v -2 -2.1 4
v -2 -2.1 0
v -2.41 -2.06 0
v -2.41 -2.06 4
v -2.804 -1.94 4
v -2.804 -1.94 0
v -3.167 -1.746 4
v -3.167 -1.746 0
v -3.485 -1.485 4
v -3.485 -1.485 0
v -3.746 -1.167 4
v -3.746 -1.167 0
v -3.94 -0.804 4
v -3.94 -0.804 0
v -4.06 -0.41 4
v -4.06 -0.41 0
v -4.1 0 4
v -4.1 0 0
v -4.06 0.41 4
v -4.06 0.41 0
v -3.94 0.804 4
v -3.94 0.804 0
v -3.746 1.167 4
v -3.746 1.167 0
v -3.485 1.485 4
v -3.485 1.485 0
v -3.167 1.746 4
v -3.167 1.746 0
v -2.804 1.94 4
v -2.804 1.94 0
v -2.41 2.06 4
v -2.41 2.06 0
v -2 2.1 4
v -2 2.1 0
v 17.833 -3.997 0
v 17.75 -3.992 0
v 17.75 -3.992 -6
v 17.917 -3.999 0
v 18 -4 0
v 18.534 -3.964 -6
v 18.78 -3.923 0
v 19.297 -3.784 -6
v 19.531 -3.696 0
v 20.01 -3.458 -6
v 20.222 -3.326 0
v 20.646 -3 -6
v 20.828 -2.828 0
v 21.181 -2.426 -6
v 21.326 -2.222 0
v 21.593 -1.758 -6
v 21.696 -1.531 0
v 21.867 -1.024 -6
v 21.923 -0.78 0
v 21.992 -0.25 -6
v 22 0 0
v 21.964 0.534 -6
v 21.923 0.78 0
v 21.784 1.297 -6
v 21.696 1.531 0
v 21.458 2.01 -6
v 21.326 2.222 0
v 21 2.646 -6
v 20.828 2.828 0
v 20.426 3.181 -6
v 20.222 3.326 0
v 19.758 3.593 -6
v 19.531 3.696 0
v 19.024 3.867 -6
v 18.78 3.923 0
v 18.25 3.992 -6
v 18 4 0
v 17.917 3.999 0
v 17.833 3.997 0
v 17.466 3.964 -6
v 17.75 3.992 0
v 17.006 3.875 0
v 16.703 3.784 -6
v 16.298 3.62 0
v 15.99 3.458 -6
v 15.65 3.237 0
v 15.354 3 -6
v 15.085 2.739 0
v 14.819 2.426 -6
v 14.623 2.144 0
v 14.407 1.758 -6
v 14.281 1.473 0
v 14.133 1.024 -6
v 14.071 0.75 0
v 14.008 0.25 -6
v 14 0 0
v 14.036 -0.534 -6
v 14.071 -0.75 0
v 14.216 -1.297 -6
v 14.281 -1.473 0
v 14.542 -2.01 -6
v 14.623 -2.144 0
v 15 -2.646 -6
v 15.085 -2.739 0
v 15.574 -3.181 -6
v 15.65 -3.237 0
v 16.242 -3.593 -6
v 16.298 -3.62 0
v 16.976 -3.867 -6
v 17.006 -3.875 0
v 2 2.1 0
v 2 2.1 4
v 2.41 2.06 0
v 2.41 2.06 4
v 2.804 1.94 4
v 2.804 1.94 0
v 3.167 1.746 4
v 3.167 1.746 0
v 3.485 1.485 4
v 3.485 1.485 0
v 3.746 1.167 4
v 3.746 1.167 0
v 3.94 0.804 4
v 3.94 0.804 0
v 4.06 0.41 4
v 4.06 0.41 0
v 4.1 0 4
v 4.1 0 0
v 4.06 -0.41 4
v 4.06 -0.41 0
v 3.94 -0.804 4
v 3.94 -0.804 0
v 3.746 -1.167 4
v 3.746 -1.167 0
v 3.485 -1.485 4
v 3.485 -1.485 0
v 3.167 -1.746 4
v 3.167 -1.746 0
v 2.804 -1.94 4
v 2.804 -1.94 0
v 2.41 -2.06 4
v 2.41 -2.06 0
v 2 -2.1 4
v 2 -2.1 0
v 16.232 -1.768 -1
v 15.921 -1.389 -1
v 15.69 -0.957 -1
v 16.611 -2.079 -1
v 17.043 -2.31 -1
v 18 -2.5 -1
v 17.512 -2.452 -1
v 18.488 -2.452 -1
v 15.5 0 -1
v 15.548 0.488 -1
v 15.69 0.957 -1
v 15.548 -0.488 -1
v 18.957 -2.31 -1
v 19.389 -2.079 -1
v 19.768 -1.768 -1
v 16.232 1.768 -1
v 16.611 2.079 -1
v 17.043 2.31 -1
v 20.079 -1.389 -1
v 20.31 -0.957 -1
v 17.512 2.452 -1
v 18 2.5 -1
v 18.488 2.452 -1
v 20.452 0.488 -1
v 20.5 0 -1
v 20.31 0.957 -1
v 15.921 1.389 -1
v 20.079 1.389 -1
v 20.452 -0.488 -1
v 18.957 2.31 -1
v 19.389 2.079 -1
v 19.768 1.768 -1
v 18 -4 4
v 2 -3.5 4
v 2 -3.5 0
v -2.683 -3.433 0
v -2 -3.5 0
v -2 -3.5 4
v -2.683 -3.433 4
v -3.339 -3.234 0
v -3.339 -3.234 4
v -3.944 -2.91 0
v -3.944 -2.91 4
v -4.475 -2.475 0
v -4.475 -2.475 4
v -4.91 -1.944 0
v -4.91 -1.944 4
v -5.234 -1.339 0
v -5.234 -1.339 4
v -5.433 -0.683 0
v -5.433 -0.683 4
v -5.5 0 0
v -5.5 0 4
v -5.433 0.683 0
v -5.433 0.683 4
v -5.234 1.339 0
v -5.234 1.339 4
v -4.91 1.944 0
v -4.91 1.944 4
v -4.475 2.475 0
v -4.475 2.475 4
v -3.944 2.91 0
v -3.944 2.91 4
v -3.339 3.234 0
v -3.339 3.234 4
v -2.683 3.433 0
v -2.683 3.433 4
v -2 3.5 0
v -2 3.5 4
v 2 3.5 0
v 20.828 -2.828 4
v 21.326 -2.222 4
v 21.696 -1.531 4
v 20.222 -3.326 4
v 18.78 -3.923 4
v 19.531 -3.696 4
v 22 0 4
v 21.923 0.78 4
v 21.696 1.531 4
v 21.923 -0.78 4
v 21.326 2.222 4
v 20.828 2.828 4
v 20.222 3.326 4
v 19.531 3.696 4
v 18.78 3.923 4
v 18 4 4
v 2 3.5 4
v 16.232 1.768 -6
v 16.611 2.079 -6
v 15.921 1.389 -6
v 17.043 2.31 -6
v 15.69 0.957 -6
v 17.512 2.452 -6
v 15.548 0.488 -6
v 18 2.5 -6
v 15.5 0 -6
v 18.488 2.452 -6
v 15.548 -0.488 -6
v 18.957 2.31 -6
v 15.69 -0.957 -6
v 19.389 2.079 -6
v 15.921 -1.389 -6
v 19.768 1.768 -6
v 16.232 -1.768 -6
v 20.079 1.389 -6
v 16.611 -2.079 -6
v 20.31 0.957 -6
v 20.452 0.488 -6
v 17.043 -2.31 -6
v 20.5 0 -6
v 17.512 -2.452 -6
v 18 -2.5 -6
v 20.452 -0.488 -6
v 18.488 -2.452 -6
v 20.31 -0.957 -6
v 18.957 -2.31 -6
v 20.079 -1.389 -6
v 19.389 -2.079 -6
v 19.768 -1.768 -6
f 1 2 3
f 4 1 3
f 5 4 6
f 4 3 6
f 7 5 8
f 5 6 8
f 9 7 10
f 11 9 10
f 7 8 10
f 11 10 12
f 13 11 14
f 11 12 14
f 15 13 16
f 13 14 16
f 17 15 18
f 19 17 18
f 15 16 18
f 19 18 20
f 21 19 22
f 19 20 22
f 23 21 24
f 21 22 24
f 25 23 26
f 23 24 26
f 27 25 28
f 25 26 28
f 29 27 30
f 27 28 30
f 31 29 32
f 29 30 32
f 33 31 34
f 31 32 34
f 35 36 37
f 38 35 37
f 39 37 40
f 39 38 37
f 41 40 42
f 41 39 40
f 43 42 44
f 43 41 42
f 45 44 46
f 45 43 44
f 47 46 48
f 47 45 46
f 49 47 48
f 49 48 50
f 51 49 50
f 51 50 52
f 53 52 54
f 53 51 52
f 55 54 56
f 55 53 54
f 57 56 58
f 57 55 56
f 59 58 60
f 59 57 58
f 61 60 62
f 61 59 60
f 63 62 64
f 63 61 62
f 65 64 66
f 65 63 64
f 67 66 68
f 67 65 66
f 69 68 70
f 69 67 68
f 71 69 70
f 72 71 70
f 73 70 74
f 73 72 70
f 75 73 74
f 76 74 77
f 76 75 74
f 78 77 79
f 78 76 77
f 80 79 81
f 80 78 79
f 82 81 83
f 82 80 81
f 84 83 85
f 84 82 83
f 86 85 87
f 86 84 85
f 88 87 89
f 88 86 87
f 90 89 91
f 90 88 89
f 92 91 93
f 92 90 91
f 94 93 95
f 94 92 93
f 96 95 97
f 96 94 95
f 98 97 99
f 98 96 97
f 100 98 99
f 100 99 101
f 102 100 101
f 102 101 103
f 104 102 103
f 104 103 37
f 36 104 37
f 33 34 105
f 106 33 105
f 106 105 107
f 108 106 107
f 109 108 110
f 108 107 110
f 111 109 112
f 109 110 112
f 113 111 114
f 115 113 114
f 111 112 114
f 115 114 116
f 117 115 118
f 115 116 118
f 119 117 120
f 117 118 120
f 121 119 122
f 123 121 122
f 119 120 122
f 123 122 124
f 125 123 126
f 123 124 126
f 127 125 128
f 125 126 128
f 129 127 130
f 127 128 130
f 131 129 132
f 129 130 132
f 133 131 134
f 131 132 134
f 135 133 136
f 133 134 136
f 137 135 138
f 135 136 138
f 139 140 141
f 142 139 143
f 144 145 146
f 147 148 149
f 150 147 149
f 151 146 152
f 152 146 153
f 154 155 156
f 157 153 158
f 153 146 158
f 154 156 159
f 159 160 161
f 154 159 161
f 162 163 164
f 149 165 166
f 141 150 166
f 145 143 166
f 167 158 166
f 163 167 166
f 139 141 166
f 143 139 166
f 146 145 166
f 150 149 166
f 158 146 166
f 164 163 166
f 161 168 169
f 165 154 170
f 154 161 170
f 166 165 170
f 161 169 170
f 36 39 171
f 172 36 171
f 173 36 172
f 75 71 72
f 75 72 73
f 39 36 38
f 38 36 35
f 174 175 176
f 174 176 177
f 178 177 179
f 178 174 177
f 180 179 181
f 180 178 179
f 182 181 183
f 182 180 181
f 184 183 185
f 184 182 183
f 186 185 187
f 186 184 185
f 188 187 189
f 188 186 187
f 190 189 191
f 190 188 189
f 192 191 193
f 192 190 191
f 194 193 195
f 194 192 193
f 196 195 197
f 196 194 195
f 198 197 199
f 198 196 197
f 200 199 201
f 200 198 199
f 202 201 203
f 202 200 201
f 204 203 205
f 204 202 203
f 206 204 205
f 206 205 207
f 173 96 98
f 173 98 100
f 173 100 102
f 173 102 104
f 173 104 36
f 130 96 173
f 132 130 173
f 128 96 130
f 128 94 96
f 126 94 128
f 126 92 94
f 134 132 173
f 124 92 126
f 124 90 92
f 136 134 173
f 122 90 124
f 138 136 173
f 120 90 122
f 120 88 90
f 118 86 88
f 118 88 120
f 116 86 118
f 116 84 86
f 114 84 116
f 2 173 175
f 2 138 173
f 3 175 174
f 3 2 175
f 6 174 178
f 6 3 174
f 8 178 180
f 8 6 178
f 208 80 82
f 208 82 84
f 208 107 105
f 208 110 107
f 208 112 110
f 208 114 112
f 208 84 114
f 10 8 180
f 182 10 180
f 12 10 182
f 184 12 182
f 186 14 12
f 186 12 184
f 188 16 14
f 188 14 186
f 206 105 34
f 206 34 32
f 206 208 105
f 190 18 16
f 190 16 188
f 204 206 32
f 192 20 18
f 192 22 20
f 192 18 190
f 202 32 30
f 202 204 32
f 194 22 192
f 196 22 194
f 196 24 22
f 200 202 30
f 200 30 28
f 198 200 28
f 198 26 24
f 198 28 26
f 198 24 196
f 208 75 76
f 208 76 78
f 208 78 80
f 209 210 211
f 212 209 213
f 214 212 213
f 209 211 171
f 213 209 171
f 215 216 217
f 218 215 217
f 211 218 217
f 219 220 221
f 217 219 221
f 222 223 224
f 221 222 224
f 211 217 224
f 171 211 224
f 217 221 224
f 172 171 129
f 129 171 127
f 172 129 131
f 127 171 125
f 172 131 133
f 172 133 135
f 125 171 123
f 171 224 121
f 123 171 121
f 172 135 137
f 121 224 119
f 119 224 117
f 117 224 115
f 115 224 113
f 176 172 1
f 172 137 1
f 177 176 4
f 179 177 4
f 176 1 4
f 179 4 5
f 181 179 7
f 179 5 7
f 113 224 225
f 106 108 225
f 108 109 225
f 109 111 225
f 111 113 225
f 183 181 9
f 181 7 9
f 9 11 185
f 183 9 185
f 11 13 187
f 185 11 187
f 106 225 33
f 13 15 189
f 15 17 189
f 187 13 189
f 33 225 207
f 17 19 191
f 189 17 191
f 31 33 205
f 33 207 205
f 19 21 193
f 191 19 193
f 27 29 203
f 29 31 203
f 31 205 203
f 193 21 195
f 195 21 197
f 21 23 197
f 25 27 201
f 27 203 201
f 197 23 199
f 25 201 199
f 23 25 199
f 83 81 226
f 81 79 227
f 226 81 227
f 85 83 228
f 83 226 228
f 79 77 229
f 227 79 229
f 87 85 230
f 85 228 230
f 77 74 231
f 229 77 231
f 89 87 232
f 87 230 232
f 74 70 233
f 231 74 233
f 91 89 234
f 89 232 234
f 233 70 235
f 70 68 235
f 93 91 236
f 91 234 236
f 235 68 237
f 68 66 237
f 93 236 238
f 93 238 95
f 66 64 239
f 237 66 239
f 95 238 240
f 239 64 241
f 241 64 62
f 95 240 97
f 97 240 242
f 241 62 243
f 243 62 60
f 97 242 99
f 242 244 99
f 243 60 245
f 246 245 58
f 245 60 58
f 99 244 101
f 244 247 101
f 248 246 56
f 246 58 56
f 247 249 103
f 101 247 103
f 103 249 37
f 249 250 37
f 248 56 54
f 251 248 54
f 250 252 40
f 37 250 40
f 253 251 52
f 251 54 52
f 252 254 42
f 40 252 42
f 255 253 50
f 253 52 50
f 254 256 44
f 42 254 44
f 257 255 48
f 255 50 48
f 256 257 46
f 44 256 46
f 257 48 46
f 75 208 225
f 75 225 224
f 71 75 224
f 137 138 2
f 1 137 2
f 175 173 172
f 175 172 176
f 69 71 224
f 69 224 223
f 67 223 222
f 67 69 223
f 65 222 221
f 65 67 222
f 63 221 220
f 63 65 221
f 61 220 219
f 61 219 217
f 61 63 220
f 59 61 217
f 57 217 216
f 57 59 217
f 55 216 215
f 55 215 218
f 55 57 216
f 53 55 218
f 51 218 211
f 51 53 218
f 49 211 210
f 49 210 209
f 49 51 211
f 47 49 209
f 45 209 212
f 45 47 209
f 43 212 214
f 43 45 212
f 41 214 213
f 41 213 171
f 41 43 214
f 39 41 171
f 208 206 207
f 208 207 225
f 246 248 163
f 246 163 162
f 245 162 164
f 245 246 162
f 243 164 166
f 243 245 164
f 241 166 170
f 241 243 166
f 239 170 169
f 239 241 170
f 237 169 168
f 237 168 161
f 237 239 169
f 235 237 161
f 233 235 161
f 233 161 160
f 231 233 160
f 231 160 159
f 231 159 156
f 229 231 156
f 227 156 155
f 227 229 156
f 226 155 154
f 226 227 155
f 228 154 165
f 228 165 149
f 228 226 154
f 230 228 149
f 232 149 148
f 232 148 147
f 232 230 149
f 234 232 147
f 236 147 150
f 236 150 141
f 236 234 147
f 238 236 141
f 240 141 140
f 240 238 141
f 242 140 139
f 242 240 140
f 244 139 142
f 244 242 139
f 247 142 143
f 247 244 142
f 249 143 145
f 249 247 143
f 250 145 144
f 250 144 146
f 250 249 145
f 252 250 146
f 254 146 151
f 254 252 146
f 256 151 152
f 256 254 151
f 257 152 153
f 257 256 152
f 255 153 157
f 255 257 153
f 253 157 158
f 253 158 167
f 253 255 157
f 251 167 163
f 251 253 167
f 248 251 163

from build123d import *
from build123d.topology import SkipClean

# Parameters (mm, degrees)
BOSS_EXTRU_1_DEPTH      = 4
ESQUISSE2_R             = 4
BOSS_EXTRU_2_DEPTH      = 6
ENL_V_START             = -6
ESQUISSE3_R             = 2.5
ENL_V_MAT_EXTRU_1_DEPTH = 5


with BuildPart() as part:
    # Esquisse1 → Boss.-Extru.1 (new body)
    with BuildSketch(Plane.XY):
        with BuildLine():
            Line((2, -3.5), (-2, -3.5))
            ThreePointArc((-2, -3.5), (-5.5, 0), (-2, 3.5))
            Line((-2, 3.5), (2, 3.5))
            Line((2, 3.5), (18, 4))
            ThreePointArc((18, 4), (22, 0), (18, -4))
            Line((18, -4), (2, -3.5))
        make_face()
        with BuildLine():
            Line((-2, 2.1), (2, 2.1))
            ThreePointArc((2, 2.1), (4.1, 0), (2, -2.1))
            Line((2, -2.1), (-2, -2.1))
            ThreePointArc((-2, -2.1), (-4.1, 0), (-2, 2.1))
        make_face(mode=Mode.SUBTRACT)
    extrude(amount=BOSS_EXTRU_1_DEPTH)

    # Esquisse2 → Boss.-Extru.2 (add)
    with SkipClean():  # the faces are left unmerged after this step: merging them gives an invalid solid
        with BuildSketch(Plane.XY):
            with Locations(Location((18, 0, 0), (0, 0, 266.420178784))):
                Circle(ESQUISSE2_R)
        extrude(amount=-BOSS_EXTRU_2_DEPTH)

    # Esquisse3 → Enlèv. mat.-Extru.1 (cut)
    with SkipClean():  # the faces are left unmerged after this step: merging them gives an invalid solid
        with BuildSketch(Plane.XY.offset(ENL_V_START)):
            with Locations((18, 0)):
                Circle(ESQUISSE3_R)
        extrude(amount=ENL_V_MAT_EXTRU_1_DEPTH, mode=Mode.SUBTRACT)


solid = part.part
